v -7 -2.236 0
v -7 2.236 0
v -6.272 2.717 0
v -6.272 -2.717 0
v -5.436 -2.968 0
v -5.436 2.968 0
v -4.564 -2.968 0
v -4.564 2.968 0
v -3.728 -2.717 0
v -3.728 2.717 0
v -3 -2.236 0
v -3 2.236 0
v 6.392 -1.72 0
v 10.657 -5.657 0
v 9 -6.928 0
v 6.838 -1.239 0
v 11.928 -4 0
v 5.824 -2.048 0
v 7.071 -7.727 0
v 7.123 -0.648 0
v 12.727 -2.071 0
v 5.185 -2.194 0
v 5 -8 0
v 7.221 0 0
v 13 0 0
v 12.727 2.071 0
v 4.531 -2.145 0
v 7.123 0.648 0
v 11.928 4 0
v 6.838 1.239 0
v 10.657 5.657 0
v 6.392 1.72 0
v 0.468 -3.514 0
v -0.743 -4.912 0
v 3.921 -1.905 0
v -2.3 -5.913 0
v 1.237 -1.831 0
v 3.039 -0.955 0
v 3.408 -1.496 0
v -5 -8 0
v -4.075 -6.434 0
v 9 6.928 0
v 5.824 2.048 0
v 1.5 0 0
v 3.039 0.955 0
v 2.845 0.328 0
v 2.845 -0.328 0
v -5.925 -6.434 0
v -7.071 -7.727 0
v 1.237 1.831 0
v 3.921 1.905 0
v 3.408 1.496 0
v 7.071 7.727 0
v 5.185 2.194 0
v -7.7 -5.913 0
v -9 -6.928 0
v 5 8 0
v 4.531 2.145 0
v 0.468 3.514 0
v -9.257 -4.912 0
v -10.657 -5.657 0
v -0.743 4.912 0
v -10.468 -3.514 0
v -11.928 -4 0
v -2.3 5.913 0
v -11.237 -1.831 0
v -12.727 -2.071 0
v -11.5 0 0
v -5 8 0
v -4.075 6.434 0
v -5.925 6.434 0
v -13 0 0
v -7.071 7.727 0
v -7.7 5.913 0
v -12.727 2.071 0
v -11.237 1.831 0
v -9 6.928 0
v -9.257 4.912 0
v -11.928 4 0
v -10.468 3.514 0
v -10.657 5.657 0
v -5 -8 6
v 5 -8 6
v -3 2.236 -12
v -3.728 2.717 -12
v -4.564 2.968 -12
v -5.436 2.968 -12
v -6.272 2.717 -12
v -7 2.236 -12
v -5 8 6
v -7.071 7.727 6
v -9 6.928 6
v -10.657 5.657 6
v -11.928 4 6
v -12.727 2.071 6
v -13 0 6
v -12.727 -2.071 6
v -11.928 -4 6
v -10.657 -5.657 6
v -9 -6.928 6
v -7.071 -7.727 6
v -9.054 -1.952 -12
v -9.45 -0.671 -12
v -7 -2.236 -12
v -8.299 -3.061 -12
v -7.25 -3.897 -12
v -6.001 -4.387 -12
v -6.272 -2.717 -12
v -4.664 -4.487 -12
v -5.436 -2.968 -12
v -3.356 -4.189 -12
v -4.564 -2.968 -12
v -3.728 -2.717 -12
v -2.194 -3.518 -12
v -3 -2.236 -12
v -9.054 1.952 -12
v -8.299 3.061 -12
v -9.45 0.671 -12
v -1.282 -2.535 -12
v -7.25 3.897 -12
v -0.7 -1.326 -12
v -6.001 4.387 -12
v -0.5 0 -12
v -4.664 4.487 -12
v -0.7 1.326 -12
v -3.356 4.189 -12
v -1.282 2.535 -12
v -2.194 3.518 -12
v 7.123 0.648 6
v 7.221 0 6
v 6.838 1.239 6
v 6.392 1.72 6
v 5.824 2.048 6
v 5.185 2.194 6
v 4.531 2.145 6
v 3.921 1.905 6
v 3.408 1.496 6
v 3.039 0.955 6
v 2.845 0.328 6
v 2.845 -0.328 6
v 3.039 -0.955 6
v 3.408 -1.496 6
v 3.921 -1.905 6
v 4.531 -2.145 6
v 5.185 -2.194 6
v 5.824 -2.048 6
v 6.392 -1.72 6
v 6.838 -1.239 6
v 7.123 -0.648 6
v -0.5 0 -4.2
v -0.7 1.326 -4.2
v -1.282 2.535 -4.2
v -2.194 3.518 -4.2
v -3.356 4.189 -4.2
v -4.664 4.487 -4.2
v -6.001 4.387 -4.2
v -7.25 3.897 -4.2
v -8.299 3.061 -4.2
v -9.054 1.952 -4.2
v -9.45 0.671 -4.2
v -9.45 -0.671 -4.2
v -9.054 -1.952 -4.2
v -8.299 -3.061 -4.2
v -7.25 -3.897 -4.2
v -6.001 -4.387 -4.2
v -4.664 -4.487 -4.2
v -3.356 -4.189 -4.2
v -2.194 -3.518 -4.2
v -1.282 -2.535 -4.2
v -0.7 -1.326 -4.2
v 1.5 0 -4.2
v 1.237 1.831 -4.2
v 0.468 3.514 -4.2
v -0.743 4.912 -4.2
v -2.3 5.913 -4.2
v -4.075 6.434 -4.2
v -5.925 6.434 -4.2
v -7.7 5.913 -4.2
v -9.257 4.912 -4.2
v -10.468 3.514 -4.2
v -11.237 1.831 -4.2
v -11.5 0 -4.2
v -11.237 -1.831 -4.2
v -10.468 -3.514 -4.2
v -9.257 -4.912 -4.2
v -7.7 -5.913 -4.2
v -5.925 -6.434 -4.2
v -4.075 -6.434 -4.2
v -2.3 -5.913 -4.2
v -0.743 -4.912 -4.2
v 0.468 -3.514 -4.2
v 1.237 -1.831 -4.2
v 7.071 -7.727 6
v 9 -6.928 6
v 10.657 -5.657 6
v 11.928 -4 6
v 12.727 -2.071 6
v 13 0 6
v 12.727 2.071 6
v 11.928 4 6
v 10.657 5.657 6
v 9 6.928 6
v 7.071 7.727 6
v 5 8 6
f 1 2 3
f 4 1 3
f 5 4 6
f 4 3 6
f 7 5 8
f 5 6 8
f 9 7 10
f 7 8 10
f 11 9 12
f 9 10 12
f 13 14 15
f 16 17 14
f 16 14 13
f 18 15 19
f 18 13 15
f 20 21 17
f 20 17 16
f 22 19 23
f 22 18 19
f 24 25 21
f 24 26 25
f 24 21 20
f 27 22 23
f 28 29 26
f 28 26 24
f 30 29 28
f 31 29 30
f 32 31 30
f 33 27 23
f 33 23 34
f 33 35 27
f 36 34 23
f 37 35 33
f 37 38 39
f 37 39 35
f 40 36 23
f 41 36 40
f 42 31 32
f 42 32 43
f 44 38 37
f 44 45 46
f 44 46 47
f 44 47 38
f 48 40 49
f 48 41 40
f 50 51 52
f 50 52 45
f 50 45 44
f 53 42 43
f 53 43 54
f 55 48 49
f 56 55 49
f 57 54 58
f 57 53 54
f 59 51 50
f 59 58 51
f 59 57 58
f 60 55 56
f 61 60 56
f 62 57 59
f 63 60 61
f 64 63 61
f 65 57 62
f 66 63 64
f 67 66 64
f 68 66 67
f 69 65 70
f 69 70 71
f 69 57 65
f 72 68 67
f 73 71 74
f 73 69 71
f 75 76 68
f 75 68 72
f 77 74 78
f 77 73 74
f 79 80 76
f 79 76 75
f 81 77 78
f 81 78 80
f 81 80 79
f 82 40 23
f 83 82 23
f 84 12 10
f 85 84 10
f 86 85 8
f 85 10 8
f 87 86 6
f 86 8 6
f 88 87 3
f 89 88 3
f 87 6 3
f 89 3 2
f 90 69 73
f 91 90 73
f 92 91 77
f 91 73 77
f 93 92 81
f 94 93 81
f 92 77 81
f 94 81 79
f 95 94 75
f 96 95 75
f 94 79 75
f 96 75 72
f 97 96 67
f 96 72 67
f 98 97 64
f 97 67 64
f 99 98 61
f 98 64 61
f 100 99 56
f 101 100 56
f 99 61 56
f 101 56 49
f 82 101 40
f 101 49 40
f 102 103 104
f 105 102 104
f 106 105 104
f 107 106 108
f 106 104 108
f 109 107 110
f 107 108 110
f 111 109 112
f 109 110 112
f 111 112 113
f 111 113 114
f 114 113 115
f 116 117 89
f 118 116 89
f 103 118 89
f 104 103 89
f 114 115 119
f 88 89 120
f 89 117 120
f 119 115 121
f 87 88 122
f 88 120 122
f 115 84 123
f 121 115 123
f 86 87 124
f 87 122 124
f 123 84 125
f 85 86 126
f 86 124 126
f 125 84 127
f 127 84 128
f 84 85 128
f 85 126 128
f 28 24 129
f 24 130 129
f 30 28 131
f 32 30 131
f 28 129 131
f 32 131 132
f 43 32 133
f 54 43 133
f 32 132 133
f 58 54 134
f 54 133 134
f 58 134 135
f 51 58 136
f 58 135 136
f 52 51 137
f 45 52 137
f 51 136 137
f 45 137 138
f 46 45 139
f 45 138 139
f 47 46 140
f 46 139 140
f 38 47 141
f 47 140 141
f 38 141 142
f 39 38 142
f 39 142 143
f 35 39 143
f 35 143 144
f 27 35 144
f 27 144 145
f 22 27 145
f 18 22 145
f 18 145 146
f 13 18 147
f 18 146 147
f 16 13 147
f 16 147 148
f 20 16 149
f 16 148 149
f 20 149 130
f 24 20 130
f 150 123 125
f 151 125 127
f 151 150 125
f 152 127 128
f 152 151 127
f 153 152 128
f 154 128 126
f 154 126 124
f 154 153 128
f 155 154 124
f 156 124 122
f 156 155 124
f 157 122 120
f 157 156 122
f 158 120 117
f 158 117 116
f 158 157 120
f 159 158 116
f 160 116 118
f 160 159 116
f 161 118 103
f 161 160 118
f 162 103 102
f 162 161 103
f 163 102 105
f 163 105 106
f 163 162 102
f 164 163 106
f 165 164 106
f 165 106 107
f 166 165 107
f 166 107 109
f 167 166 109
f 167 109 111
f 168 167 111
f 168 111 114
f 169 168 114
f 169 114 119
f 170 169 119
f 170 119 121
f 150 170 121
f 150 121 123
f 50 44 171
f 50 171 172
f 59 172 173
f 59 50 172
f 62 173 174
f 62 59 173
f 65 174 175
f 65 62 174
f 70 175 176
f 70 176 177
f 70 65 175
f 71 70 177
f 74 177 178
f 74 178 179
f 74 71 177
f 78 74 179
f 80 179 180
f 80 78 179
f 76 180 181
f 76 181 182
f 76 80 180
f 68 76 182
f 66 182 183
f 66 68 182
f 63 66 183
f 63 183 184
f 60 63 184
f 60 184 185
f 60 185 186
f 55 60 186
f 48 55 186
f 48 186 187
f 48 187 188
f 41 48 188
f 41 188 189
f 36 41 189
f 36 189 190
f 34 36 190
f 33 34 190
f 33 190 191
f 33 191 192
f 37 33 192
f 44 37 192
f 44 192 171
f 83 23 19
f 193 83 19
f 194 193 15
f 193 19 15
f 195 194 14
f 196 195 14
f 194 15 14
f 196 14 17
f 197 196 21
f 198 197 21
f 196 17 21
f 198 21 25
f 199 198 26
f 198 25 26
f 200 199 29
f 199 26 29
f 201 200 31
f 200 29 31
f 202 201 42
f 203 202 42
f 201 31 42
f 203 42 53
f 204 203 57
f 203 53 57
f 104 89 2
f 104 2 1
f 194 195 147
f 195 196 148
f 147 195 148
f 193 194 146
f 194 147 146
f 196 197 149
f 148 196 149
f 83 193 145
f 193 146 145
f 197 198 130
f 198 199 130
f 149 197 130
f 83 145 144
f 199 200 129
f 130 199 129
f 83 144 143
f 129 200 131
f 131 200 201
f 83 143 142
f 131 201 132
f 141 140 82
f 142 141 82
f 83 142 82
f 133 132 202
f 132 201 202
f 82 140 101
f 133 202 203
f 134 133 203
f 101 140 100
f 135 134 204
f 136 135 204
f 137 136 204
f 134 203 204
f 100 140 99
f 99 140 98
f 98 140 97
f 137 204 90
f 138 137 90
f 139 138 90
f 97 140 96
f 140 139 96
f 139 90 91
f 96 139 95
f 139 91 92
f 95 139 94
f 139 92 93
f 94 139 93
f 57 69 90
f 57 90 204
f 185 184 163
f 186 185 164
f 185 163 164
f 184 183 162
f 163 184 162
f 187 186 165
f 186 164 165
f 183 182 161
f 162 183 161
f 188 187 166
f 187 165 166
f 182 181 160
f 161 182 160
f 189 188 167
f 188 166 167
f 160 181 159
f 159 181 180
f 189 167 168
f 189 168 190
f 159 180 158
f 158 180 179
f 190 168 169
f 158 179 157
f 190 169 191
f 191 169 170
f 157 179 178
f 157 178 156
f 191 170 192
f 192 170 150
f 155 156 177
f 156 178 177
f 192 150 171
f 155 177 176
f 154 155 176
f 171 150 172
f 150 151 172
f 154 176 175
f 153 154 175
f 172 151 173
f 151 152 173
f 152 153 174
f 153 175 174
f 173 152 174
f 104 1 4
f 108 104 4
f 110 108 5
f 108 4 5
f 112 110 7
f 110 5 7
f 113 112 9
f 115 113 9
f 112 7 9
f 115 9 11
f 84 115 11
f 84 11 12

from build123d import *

# Parameters (mm, degrees)
PAD020_DEPTH = 20
SKETCH023_R  = 2.2
PAD022_DEPTH = 10
SKETCH018_R  = 6
PAD016_DEPTH = 5
SKETCH020_R  = 4.5
PAD018_DEPTH = 12
SKETCH021_R  = 6.5
PAD019_DEPTH = 4.2
PAD021_DEPTH = 6


with BuildPart() as motor_linkage_hole_body001:
    # Sketch022 → Pad020 (new body)
    with BuildSketch(Plane.XY):
        with BuildLine():
            Line((-7, 2.236068), (-7, -2.236068))
            ThreePointArc((-7, -2.236068), (-5, -3), (-3, -2.236068))
            Line((-3, -2.236068), (-3, 2.236068))
            ThreePointArc((-3, 2.236068), (-5, 3), (-7, 2.236068))
        make_face()
    extrude(amount=-PAD020_DEPTH)


with BuildPart() as hole_fusion001:
    # Sketch023 → Pad022 (new body, symmetric)
    with BuildSketch(Plane.XY):
        with Locations((5.020646, 0)):
            Circle(SKETCH023_R)
    extrude(amount=PAD022_DEPTH, both=True)

    # Fusion012: union motor linkage hole body001
    add(motor_linkage_hole_body001.part)


with BuildPart() as motor_linkage_cut001:
    # Sketch018 → Pad016 (new body)
    with BuildSketch(Plane.XY):
        with Locations((5, 0)):
            Circle(SKETCH018_R)
    extrude(amount=PAD016_DEPTH)

    # Sketch020 → Pad018 (join)
    with BuildSketch(Plane.XY):
        with Locations((-5, 0)):
            Circle(SKETCH020_R)
    extrude(amount=-PAD018_DEPTH)

    # Sketch021 → Pad019 (join)
    with BuildSketch(Plane.XY):
        with Locations((-5, 0)):
            Circle(SKETCH021_R)
    extrude(amount=-PAD019_DEPTH)

    # Sketch017 → Pad021 (join)
    with BuildSketch(Plane.XY):
        with BuildLine():
            Line((-5, 8), (5, 8))
            ThreePointArc((5, -8), (13, 0), (5, 8))
            Line((-5, -8), (5, -8))
            ThreePointArc((-5, 8), (-13, 0), (-5, -8))
        make_face()
    extrude(amount=PAD021_DEPTH)

    # Cut006: cut hole fusion001
    add(hole_fusion001.part, mode=Mode.SUBTRACT)


solid = motor_linkage_cut001.part
